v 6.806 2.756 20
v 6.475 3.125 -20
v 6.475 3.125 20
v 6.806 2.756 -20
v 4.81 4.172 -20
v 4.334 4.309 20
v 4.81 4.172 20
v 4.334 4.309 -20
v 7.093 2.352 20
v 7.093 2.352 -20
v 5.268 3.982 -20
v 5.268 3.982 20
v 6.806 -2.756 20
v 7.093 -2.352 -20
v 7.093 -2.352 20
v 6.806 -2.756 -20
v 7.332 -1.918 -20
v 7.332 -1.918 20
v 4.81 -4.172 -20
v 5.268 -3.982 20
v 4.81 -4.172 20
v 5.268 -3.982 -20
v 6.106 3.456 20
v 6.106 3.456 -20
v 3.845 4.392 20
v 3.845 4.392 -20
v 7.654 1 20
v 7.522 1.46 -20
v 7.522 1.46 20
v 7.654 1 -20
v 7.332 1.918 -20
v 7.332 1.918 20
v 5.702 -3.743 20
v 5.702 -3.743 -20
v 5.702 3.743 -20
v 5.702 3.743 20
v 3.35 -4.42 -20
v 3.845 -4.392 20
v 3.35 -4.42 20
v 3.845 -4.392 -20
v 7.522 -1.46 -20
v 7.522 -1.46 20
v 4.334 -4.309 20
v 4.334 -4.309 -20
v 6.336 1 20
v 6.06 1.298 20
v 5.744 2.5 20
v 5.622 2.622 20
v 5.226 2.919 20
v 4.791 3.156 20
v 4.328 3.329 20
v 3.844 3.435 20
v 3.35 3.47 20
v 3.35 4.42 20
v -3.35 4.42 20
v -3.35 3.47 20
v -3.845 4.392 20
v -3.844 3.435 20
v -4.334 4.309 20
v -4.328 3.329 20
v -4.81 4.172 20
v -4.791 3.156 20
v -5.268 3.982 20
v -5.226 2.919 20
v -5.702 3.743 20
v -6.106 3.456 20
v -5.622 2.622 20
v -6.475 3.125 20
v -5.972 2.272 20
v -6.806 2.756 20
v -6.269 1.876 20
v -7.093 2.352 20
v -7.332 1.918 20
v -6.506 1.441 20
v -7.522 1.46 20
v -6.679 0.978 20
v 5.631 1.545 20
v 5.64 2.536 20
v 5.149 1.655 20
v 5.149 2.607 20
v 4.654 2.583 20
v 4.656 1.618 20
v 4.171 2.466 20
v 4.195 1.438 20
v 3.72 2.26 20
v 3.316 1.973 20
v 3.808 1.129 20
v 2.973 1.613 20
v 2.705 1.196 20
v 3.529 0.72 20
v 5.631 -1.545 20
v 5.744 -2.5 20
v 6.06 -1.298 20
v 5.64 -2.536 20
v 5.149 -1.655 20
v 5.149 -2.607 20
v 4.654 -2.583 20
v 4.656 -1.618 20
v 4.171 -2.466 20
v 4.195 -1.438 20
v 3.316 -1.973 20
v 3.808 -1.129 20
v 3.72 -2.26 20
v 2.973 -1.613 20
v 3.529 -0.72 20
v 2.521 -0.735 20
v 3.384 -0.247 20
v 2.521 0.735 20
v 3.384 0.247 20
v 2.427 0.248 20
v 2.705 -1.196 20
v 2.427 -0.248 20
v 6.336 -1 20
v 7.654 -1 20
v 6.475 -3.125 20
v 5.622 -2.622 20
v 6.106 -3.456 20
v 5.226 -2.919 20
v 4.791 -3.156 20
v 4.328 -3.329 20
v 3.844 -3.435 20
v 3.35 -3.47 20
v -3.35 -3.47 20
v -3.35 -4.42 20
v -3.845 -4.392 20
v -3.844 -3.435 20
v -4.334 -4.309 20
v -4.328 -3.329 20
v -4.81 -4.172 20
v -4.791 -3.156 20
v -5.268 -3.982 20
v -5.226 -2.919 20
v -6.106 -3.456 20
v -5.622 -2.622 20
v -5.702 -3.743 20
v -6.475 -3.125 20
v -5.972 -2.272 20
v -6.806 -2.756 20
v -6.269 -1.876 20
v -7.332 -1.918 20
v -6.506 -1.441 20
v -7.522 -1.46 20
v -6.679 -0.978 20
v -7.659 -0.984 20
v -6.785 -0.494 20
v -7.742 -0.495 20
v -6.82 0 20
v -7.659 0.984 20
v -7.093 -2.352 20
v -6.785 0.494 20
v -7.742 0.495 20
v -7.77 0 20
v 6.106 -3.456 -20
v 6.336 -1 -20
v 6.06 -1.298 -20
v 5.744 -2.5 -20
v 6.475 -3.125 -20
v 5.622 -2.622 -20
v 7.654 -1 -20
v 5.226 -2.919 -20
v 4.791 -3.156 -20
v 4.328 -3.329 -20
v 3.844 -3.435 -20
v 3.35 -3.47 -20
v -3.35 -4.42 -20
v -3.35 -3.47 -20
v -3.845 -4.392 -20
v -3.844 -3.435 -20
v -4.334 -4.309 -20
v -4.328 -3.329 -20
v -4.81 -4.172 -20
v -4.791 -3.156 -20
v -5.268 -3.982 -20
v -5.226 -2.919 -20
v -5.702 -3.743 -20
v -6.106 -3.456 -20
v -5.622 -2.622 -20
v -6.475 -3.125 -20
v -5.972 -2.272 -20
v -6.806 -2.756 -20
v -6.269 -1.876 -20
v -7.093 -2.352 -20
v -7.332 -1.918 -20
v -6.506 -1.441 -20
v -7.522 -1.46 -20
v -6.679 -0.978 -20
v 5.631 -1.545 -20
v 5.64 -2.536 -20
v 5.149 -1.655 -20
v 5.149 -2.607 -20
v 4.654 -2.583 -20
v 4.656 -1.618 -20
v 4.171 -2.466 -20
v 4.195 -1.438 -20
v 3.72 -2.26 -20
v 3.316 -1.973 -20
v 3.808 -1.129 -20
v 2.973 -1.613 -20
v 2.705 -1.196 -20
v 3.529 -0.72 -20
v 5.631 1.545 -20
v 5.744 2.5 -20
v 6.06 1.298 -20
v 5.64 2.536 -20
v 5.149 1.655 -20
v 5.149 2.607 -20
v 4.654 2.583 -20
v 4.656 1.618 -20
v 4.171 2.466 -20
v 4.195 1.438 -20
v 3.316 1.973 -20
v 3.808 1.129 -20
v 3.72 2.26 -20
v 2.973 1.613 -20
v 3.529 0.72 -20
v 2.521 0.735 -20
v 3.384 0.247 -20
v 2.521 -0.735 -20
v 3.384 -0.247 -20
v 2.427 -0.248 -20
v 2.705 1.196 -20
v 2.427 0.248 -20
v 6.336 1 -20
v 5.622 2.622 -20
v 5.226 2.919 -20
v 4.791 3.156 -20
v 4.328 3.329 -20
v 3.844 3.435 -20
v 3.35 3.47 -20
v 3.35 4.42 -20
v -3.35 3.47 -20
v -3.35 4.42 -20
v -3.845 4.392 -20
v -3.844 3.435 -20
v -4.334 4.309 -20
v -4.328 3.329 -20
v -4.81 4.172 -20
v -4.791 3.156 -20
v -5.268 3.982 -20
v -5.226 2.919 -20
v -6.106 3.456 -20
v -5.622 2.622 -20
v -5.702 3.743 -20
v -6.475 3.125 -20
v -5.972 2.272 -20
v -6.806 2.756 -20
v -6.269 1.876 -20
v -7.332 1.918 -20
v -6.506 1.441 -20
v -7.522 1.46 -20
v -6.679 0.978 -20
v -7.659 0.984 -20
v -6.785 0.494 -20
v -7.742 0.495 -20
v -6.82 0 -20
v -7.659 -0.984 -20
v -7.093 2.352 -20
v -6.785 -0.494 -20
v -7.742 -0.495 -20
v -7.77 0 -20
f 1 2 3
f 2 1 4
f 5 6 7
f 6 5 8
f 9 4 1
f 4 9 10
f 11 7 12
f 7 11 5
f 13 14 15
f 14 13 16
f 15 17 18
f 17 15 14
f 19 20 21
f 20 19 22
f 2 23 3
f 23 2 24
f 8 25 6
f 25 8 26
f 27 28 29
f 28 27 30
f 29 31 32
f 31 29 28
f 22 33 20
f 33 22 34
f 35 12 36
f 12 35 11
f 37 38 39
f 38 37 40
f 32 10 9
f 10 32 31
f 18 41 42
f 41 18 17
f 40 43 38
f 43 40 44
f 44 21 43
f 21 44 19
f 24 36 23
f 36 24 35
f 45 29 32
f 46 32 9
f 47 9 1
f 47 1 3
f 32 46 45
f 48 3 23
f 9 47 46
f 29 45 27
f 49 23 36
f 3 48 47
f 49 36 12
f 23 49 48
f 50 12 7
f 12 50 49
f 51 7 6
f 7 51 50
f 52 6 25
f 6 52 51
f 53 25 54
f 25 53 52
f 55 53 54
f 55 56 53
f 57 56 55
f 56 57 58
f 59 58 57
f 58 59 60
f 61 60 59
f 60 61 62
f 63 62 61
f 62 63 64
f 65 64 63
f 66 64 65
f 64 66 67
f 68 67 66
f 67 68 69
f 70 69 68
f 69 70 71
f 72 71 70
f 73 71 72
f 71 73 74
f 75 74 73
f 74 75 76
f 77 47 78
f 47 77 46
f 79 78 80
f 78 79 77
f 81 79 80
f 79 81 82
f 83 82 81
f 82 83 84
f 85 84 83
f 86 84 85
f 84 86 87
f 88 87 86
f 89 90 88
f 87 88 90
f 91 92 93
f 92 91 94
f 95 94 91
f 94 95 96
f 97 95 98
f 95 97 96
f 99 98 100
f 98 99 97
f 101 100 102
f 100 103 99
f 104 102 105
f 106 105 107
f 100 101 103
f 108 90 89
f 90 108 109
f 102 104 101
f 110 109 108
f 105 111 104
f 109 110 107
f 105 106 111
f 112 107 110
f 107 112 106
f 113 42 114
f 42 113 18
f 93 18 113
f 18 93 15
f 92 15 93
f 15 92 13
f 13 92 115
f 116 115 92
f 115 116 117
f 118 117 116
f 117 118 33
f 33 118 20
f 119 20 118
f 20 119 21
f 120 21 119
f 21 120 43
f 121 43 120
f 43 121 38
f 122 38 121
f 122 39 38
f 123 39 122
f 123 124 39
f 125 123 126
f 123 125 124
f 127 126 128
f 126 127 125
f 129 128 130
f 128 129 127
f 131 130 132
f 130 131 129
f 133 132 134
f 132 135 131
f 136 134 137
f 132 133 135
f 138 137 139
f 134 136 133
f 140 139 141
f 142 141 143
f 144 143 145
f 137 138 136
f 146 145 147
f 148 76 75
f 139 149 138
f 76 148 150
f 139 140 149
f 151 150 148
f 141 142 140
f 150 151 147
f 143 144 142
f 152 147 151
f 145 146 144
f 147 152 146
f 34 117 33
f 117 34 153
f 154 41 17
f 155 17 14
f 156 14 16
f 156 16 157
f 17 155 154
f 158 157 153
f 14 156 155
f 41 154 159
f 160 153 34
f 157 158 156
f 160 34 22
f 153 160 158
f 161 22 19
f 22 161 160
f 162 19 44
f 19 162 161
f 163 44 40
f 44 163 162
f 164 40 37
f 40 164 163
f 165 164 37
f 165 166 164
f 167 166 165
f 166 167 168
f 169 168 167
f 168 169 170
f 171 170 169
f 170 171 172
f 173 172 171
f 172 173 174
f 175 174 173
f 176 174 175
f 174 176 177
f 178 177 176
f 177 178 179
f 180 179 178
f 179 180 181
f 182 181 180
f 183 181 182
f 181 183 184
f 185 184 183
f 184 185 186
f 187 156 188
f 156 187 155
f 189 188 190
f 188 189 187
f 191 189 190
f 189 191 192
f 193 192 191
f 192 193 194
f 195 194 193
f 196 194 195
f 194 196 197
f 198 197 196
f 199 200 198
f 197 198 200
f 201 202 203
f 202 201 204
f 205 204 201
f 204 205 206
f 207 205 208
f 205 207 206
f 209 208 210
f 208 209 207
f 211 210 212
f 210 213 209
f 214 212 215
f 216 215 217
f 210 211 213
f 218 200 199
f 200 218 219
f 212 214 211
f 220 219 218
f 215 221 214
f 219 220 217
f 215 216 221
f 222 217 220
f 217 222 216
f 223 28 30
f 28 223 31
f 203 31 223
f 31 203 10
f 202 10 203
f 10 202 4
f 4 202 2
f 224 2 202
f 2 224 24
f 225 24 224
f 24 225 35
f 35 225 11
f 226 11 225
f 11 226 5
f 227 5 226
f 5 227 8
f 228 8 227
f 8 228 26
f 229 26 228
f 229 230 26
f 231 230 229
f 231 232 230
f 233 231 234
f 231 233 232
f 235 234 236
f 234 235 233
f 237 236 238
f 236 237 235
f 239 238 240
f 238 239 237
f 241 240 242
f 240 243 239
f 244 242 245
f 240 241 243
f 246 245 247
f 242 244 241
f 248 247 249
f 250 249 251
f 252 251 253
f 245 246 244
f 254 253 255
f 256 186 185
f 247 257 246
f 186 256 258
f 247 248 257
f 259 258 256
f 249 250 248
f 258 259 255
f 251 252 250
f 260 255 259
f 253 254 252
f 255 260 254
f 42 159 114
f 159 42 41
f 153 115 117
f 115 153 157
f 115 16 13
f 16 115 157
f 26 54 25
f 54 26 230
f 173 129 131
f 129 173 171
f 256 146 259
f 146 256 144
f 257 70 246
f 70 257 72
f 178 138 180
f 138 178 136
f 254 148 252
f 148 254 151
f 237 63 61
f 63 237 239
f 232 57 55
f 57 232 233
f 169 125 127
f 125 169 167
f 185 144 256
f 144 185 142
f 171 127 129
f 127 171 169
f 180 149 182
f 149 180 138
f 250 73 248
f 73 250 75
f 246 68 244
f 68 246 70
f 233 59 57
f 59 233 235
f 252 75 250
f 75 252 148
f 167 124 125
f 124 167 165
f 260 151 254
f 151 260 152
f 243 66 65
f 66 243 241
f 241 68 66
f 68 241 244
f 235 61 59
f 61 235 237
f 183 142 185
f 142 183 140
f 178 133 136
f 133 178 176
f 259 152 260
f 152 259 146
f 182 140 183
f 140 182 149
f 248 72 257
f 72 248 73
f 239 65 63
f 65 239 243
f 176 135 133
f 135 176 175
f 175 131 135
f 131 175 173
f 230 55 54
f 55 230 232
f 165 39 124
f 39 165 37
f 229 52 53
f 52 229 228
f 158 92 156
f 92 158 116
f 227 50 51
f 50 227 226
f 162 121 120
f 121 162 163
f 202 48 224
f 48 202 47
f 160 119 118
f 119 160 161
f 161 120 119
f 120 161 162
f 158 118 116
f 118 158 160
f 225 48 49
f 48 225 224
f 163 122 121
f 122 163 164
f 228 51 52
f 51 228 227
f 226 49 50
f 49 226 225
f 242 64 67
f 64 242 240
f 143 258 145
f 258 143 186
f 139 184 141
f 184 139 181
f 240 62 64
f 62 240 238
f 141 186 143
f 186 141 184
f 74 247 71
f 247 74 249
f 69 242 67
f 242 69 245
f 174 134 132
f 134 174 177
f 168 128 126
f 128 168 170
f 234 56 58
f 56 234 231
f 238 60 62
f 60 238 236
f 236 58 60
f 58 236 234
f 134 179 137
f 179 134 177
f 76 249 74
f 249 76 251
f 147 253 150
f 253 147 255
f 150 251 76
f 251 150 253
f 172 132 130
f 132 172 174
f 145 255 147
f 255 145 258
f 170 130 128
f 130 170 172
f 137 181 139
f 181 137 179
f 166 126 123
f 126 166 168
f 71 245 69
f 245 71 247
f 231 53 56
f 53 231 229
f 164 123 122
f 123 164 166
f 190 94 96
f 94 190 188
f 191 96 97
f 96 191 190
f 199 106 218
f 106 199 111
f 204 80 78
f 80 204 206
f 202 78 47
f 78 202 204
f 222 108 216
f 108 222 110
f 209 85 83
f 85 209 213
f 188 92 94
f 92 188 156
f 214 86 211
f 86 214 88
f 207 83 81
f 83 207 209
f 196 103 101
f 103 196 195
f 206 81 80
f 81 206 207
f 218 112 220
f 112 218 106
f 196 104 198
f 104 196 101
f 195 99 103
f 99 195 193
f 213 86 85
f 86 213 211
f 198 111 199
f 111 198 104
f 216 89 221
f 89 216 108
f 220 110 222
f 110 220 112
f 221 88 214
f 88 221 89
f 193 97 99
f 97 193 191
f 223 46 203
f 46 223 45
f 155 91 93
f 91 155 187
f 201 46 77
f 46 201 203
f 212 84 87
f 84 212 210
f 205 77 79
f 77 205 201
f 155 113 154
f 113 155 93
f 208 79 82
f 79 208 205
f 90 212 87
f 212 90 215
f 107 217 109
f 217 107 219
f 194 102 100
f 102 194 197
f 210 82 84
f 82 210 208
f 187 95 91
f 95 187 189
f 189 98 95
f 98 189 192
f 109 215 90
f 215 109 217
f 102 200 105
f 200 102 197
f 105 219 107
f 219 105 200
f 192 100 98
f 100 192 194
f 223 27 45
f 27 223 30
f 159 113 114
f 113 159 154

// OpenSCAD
// file: regazza_mast_constants.scad
mast_height = 40;

// Mast
mast_exterior_diameter = 8.84;
mast_interior_diameter = 6.94;
mast_interior_circle_center_distance = 6.7;

$fa=1;
$fs=0.5;

// Sail Bolt Rope Track
bolt_rope_inner = 3.32;
bolt_rope_outer = bolt_rope_inner + 1.9;
// main file
include <regazza_mast_constants.scad>

difference(){
    union(){
        // Basic shelll
       difference(){
            // Outside shell
            union(){
                // Radius 1
                translate([mast_interior_circle_center_distance/2, 0, 0]) cylinder(mast_height, d=mast_exterior_diameter, center=true);
                // Radius 2
                translate([-mast_interior_circle_center_distance/2, 0, 0]) cylinder(mast_height, d=mast_exterior_diameter, center=true);
                // Interior Fill
                cube([mast_interior_circle_center_distance, mast_exterior_diameter,mast_height], center=true);
            }

            // Inside void space
            translate([0, 0, -.1]) scale([1, 1, 1.1]) union(){
                // Radius 1
                translate([mast_interior_circle_center_distance/2, 0, 0]) cylinder(mast_height, d=mast_interior_diameter, center=true);
                // Radius 2
                translate([-mast_interior_circle_center_distance/2, 0, 0]) cylinder(mast_height, d=mast_interior_diameter, center=true);
                // Interior Fill
                cube([mast_interior_circle_center_distance, mast_interior_diameter,mast_height], center=true);
            }
        }

        // Sail bolt rope track
       translate([mast_interior_circle_center_distance*3/4, 0, 0]) difference(){
            cylinder(mast_height, d=bolt_rope_outer, center=true);
            cylinder(mast_height + 2, d=bolt_rope_inner, center=true);
        }
    }

    // Sail body cutout
    translate([mast_interior_circle_center_distance/2 + mast_interior_diameter/2, 0, 0]) cube([3,2,mast_height+2], center=true);
}
